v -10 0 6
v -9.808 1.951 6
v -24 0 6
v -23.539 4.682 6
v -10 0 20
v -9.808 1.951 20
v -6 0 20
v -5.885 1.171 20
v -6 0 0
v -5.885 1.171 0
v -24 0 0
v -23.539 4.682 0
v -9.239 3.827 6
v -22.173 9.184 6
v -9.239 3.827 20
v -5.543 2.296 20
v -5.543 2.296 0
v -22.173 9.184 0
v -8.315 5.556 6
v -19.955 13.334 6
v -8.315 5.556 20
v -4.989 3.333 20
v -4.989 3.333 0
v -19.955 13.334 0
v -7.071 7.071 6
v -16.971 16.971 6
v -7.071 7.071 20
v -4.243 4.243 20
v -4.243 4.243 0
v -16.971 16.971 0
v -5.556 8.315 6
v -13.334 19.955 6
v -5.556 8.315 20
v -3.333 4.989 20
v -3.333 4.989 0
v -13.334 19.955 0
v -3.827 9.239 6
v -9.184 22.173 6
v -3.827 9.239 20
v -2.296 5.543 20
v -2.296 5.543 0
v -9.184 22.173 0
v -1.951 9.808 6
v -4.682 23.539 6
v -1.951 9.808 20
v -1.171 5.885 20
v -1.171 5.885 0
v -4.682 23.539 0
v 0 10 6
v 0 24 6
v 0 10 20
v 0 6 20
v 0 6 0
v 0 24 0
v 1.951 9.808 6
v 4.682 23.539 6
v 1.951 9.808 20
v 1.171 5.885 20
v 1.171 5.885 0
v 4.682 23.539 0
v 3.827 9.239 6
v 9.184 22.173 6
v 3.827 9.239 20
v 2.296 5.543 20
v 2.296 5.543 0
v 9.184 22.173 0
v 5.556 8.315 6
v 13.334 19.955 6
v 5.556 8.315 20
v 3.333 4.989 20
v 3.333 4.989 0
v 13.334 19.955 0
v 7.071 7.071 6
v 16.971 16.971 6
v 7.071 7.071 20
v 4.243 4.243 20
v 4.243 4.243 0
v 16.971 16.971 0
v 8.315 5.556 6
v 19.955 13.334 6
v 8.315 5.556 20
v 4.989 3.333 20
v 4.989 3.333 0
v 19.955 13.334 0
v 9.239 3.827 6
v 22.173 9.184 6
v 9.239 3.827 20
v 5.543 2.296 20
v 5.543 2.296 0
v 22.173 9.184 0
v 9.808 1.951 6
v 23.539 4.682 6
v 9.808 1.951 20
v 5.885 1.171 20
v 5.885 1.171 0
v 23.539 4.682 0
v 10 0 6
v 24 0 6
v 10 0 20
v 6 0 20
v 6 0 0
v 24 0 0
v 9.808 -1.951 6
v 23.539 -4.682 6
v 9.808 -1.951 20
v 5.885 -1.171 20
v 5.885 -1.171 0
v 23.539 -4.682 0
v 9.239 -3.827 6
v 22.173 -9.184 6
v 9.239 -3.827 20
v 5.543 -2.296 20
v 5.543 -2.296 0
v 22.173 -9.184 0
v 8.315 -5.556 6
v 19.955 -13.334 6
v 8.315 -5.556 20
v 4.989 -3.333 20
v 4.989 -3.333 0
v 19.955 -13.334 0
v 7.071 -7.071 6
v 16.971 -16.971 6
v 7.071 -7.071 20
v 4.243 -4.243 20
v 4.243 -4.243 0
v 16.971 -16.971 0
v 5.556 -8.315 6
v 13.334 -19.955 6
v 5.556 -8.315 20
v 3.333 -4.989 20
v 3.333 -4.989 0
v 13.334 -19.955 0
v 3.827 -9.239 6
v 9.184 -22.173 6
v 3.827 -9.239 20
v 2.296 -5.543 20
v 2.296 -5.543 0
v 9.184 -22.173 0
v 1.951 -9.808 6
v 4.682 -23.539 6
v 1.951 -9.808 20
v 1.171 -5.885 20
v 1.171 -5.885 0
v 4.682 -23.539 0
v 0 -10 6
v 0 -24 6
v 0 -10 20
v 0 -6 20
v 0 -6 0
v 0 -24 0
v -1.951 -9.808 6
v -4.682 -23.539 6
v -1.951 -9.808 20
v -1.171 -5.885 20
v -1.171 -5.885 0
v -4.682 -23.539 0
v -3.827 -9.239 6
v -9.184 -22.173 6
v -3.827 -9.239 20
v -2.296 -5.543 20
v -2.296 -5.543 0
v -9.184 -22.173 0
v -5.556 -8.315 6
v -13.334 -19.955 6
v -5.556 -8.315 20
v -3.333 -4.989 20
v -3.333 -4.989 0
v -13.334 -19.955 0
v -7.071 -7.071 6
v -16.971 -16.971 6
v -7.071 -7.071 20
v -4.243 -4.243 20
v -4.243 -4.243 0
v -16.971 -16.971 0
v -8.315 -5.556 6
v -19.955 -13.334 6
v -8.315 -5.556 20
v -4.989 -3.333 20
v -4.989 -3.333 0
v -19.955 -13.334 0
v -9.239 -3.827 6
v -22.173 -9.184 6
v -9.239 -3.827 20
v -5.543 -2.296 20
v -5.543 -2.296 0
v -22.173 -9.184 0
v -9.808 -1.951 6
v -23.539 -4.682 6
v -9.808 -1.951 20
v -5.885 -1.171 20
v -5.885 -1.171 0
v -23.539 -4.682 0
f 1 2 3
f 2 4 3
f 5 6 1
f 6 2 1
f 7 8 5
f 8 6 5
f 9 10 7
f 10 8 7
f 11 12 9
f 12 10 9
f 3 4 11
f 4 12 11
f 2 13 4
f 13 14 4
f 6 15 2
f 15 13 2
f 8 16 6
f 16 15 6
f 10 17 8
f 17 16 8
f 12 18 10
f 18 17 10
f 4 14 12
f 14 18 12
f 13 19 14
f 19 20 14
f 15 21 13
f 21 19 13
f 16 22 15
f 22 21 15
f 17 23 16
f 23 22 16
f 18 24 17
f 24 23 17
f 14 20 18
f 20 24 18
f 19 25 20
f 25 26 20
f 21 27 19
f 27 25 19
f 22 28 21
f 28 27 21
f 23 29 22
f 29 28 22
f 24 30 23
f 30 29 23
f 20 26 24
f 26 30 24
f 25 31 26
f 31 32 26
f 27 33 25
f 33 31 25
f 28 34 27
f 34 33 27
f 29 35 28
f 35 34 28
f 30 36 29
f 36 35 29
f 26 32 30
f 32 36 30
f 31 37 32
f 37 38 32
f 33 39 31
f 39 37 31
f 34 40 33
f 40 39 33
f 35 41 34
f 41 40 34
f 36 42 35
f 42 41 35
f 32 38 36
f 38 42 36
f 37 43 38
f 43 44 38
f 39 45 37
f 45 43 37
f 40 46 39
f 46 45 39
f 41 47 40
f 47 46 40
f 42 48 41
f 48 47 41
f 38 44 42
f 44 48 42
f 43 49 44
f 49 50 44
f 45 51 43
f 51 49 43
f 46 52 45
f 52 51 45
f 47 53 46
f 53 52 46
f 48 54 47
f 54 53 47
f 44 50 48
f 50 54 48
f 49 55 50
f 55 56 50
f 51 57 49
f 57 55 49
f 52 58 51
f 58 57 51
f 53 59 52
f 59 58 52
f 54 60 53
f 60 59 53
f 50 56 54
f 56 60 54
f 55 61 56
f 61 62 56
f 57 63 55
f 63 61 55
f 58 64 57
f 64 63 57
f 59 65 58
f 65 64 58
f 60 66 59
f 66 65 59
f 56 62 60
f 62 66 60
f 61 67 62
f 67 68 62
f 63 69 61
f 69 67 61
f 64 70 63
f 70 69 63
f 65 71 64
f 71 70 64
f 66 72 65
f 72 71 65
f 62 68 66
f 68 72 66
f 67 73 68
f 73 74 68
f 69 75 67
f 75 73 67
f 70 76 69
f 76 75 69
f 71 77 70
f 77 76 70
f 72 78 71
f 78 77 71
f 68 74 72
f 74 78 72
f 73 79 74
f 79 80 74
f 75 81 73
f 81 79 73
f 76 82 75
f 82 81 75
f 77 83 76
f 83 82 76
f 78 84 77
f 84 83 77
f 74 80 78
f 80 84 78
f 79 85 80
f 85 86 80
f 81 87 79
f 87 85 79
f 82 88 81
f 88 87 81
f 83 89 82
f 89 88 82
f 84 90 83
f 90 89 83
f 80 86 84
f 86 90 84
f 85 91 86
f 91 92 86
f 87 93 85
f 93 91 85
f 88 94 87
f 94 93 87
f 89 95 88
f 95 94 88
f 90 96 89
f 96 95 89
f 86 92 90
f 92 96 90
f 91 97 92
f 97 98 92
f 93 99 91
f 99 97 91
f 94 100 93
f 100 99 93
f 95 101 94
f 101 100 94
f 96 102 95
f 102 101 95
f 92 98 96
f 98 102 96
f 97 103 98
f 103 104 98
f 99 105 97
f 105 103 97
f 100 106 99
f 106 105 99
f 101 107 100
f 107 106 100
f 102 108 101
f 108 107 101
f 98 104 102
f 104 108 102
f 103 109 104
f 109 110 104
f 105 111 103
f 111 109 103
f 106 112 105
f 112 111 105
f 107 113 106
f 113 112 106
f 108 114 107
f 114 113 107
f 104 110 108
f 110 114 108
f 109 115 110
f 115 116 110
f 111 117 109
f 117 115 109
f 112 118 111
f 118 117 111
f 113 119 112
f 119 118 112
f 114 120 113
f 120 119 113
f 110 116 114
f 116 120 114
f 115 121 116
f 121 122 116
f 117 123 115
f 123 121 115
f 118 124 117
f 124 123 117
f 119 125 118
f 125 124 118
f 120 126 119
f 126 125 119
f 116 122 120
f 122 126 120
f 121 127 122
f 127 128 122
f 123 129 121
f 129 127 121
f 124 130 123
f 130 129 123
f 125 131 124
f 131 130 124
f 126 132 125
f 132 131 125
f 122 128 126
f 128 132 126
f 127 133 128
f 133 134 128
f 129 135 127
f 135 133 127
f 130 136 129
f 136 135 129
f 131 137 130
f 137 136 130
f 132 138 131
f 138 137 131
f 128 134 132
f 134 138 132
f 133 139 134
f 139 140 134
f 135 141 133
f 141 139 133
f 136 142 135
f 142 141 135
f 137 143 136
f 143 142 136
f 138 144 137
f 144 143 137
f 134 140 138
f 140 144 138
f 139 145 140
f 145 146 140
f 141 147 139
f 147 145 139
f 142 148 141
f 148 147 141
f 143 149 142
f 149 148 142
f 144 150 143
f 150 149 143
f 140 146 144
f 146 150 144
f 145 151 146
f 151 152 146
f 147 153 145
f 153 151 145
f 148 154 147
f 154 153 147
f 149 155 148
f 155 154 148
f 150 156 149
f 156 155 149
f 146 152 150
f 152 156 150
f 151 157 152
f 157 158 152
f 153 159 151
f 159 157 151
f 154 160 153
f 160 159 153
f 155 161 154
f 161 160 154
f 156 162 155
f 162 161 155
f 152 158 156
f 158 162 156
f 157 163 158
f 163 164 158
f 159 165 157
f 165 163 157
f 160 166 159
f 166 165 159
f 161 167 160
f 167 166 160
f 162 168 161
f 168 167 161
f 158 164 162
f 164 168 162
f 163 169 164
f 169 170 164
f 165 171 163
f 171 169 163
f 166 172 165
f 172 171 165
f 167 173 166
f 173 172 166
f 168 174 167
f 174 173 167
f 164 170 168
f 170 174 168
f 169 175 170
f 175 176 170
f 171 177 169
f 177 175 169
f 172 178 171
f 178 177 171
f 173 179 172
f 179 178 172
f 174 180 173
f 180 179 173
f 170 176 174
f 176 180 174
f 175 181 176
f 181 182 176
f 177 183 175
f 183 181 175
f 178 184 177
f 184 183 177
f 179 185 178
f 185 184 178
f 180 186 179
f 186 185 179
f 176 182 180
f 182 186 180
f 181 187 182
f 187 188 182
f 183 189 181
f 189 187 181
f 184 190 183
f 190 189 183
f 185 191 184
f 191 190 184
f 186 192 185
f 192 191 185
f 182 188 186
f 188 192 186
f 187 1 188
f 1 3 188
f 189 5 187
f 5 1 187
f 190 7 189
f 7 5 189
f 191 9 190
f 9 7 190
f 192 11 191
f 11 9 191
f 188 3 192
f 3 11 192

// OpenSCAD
$fn = 32;

// ----------------------------------------------------------------------
// Revolved part: flanged bushing R24
// ----------------------------------------------------------------------

// --- parameters (mm) ---
bore_r = 6;               // bore radius
flange_r = 24;            // flange radius
flange_h = 6;             // flange thickness
sleeve_r = 10;            // sleeve radius
total_h = 20;             // overall height
revolve_angle = 360;      // revolve sweep, degrees

bore_d = 2 * bore_r;
flange_d = 2 * flange_r;
sleeve_d = 2 * sleeve_r;

profile = [[6, 0], [24, 0], [24, 6], [10, 6], [10, 20], [6, 20]];  // primary outline, 6 points, counter clockwise

// --- the one profile operation ---
rotate_extrude(angle = revolve_angle) polygon(points = profile);
